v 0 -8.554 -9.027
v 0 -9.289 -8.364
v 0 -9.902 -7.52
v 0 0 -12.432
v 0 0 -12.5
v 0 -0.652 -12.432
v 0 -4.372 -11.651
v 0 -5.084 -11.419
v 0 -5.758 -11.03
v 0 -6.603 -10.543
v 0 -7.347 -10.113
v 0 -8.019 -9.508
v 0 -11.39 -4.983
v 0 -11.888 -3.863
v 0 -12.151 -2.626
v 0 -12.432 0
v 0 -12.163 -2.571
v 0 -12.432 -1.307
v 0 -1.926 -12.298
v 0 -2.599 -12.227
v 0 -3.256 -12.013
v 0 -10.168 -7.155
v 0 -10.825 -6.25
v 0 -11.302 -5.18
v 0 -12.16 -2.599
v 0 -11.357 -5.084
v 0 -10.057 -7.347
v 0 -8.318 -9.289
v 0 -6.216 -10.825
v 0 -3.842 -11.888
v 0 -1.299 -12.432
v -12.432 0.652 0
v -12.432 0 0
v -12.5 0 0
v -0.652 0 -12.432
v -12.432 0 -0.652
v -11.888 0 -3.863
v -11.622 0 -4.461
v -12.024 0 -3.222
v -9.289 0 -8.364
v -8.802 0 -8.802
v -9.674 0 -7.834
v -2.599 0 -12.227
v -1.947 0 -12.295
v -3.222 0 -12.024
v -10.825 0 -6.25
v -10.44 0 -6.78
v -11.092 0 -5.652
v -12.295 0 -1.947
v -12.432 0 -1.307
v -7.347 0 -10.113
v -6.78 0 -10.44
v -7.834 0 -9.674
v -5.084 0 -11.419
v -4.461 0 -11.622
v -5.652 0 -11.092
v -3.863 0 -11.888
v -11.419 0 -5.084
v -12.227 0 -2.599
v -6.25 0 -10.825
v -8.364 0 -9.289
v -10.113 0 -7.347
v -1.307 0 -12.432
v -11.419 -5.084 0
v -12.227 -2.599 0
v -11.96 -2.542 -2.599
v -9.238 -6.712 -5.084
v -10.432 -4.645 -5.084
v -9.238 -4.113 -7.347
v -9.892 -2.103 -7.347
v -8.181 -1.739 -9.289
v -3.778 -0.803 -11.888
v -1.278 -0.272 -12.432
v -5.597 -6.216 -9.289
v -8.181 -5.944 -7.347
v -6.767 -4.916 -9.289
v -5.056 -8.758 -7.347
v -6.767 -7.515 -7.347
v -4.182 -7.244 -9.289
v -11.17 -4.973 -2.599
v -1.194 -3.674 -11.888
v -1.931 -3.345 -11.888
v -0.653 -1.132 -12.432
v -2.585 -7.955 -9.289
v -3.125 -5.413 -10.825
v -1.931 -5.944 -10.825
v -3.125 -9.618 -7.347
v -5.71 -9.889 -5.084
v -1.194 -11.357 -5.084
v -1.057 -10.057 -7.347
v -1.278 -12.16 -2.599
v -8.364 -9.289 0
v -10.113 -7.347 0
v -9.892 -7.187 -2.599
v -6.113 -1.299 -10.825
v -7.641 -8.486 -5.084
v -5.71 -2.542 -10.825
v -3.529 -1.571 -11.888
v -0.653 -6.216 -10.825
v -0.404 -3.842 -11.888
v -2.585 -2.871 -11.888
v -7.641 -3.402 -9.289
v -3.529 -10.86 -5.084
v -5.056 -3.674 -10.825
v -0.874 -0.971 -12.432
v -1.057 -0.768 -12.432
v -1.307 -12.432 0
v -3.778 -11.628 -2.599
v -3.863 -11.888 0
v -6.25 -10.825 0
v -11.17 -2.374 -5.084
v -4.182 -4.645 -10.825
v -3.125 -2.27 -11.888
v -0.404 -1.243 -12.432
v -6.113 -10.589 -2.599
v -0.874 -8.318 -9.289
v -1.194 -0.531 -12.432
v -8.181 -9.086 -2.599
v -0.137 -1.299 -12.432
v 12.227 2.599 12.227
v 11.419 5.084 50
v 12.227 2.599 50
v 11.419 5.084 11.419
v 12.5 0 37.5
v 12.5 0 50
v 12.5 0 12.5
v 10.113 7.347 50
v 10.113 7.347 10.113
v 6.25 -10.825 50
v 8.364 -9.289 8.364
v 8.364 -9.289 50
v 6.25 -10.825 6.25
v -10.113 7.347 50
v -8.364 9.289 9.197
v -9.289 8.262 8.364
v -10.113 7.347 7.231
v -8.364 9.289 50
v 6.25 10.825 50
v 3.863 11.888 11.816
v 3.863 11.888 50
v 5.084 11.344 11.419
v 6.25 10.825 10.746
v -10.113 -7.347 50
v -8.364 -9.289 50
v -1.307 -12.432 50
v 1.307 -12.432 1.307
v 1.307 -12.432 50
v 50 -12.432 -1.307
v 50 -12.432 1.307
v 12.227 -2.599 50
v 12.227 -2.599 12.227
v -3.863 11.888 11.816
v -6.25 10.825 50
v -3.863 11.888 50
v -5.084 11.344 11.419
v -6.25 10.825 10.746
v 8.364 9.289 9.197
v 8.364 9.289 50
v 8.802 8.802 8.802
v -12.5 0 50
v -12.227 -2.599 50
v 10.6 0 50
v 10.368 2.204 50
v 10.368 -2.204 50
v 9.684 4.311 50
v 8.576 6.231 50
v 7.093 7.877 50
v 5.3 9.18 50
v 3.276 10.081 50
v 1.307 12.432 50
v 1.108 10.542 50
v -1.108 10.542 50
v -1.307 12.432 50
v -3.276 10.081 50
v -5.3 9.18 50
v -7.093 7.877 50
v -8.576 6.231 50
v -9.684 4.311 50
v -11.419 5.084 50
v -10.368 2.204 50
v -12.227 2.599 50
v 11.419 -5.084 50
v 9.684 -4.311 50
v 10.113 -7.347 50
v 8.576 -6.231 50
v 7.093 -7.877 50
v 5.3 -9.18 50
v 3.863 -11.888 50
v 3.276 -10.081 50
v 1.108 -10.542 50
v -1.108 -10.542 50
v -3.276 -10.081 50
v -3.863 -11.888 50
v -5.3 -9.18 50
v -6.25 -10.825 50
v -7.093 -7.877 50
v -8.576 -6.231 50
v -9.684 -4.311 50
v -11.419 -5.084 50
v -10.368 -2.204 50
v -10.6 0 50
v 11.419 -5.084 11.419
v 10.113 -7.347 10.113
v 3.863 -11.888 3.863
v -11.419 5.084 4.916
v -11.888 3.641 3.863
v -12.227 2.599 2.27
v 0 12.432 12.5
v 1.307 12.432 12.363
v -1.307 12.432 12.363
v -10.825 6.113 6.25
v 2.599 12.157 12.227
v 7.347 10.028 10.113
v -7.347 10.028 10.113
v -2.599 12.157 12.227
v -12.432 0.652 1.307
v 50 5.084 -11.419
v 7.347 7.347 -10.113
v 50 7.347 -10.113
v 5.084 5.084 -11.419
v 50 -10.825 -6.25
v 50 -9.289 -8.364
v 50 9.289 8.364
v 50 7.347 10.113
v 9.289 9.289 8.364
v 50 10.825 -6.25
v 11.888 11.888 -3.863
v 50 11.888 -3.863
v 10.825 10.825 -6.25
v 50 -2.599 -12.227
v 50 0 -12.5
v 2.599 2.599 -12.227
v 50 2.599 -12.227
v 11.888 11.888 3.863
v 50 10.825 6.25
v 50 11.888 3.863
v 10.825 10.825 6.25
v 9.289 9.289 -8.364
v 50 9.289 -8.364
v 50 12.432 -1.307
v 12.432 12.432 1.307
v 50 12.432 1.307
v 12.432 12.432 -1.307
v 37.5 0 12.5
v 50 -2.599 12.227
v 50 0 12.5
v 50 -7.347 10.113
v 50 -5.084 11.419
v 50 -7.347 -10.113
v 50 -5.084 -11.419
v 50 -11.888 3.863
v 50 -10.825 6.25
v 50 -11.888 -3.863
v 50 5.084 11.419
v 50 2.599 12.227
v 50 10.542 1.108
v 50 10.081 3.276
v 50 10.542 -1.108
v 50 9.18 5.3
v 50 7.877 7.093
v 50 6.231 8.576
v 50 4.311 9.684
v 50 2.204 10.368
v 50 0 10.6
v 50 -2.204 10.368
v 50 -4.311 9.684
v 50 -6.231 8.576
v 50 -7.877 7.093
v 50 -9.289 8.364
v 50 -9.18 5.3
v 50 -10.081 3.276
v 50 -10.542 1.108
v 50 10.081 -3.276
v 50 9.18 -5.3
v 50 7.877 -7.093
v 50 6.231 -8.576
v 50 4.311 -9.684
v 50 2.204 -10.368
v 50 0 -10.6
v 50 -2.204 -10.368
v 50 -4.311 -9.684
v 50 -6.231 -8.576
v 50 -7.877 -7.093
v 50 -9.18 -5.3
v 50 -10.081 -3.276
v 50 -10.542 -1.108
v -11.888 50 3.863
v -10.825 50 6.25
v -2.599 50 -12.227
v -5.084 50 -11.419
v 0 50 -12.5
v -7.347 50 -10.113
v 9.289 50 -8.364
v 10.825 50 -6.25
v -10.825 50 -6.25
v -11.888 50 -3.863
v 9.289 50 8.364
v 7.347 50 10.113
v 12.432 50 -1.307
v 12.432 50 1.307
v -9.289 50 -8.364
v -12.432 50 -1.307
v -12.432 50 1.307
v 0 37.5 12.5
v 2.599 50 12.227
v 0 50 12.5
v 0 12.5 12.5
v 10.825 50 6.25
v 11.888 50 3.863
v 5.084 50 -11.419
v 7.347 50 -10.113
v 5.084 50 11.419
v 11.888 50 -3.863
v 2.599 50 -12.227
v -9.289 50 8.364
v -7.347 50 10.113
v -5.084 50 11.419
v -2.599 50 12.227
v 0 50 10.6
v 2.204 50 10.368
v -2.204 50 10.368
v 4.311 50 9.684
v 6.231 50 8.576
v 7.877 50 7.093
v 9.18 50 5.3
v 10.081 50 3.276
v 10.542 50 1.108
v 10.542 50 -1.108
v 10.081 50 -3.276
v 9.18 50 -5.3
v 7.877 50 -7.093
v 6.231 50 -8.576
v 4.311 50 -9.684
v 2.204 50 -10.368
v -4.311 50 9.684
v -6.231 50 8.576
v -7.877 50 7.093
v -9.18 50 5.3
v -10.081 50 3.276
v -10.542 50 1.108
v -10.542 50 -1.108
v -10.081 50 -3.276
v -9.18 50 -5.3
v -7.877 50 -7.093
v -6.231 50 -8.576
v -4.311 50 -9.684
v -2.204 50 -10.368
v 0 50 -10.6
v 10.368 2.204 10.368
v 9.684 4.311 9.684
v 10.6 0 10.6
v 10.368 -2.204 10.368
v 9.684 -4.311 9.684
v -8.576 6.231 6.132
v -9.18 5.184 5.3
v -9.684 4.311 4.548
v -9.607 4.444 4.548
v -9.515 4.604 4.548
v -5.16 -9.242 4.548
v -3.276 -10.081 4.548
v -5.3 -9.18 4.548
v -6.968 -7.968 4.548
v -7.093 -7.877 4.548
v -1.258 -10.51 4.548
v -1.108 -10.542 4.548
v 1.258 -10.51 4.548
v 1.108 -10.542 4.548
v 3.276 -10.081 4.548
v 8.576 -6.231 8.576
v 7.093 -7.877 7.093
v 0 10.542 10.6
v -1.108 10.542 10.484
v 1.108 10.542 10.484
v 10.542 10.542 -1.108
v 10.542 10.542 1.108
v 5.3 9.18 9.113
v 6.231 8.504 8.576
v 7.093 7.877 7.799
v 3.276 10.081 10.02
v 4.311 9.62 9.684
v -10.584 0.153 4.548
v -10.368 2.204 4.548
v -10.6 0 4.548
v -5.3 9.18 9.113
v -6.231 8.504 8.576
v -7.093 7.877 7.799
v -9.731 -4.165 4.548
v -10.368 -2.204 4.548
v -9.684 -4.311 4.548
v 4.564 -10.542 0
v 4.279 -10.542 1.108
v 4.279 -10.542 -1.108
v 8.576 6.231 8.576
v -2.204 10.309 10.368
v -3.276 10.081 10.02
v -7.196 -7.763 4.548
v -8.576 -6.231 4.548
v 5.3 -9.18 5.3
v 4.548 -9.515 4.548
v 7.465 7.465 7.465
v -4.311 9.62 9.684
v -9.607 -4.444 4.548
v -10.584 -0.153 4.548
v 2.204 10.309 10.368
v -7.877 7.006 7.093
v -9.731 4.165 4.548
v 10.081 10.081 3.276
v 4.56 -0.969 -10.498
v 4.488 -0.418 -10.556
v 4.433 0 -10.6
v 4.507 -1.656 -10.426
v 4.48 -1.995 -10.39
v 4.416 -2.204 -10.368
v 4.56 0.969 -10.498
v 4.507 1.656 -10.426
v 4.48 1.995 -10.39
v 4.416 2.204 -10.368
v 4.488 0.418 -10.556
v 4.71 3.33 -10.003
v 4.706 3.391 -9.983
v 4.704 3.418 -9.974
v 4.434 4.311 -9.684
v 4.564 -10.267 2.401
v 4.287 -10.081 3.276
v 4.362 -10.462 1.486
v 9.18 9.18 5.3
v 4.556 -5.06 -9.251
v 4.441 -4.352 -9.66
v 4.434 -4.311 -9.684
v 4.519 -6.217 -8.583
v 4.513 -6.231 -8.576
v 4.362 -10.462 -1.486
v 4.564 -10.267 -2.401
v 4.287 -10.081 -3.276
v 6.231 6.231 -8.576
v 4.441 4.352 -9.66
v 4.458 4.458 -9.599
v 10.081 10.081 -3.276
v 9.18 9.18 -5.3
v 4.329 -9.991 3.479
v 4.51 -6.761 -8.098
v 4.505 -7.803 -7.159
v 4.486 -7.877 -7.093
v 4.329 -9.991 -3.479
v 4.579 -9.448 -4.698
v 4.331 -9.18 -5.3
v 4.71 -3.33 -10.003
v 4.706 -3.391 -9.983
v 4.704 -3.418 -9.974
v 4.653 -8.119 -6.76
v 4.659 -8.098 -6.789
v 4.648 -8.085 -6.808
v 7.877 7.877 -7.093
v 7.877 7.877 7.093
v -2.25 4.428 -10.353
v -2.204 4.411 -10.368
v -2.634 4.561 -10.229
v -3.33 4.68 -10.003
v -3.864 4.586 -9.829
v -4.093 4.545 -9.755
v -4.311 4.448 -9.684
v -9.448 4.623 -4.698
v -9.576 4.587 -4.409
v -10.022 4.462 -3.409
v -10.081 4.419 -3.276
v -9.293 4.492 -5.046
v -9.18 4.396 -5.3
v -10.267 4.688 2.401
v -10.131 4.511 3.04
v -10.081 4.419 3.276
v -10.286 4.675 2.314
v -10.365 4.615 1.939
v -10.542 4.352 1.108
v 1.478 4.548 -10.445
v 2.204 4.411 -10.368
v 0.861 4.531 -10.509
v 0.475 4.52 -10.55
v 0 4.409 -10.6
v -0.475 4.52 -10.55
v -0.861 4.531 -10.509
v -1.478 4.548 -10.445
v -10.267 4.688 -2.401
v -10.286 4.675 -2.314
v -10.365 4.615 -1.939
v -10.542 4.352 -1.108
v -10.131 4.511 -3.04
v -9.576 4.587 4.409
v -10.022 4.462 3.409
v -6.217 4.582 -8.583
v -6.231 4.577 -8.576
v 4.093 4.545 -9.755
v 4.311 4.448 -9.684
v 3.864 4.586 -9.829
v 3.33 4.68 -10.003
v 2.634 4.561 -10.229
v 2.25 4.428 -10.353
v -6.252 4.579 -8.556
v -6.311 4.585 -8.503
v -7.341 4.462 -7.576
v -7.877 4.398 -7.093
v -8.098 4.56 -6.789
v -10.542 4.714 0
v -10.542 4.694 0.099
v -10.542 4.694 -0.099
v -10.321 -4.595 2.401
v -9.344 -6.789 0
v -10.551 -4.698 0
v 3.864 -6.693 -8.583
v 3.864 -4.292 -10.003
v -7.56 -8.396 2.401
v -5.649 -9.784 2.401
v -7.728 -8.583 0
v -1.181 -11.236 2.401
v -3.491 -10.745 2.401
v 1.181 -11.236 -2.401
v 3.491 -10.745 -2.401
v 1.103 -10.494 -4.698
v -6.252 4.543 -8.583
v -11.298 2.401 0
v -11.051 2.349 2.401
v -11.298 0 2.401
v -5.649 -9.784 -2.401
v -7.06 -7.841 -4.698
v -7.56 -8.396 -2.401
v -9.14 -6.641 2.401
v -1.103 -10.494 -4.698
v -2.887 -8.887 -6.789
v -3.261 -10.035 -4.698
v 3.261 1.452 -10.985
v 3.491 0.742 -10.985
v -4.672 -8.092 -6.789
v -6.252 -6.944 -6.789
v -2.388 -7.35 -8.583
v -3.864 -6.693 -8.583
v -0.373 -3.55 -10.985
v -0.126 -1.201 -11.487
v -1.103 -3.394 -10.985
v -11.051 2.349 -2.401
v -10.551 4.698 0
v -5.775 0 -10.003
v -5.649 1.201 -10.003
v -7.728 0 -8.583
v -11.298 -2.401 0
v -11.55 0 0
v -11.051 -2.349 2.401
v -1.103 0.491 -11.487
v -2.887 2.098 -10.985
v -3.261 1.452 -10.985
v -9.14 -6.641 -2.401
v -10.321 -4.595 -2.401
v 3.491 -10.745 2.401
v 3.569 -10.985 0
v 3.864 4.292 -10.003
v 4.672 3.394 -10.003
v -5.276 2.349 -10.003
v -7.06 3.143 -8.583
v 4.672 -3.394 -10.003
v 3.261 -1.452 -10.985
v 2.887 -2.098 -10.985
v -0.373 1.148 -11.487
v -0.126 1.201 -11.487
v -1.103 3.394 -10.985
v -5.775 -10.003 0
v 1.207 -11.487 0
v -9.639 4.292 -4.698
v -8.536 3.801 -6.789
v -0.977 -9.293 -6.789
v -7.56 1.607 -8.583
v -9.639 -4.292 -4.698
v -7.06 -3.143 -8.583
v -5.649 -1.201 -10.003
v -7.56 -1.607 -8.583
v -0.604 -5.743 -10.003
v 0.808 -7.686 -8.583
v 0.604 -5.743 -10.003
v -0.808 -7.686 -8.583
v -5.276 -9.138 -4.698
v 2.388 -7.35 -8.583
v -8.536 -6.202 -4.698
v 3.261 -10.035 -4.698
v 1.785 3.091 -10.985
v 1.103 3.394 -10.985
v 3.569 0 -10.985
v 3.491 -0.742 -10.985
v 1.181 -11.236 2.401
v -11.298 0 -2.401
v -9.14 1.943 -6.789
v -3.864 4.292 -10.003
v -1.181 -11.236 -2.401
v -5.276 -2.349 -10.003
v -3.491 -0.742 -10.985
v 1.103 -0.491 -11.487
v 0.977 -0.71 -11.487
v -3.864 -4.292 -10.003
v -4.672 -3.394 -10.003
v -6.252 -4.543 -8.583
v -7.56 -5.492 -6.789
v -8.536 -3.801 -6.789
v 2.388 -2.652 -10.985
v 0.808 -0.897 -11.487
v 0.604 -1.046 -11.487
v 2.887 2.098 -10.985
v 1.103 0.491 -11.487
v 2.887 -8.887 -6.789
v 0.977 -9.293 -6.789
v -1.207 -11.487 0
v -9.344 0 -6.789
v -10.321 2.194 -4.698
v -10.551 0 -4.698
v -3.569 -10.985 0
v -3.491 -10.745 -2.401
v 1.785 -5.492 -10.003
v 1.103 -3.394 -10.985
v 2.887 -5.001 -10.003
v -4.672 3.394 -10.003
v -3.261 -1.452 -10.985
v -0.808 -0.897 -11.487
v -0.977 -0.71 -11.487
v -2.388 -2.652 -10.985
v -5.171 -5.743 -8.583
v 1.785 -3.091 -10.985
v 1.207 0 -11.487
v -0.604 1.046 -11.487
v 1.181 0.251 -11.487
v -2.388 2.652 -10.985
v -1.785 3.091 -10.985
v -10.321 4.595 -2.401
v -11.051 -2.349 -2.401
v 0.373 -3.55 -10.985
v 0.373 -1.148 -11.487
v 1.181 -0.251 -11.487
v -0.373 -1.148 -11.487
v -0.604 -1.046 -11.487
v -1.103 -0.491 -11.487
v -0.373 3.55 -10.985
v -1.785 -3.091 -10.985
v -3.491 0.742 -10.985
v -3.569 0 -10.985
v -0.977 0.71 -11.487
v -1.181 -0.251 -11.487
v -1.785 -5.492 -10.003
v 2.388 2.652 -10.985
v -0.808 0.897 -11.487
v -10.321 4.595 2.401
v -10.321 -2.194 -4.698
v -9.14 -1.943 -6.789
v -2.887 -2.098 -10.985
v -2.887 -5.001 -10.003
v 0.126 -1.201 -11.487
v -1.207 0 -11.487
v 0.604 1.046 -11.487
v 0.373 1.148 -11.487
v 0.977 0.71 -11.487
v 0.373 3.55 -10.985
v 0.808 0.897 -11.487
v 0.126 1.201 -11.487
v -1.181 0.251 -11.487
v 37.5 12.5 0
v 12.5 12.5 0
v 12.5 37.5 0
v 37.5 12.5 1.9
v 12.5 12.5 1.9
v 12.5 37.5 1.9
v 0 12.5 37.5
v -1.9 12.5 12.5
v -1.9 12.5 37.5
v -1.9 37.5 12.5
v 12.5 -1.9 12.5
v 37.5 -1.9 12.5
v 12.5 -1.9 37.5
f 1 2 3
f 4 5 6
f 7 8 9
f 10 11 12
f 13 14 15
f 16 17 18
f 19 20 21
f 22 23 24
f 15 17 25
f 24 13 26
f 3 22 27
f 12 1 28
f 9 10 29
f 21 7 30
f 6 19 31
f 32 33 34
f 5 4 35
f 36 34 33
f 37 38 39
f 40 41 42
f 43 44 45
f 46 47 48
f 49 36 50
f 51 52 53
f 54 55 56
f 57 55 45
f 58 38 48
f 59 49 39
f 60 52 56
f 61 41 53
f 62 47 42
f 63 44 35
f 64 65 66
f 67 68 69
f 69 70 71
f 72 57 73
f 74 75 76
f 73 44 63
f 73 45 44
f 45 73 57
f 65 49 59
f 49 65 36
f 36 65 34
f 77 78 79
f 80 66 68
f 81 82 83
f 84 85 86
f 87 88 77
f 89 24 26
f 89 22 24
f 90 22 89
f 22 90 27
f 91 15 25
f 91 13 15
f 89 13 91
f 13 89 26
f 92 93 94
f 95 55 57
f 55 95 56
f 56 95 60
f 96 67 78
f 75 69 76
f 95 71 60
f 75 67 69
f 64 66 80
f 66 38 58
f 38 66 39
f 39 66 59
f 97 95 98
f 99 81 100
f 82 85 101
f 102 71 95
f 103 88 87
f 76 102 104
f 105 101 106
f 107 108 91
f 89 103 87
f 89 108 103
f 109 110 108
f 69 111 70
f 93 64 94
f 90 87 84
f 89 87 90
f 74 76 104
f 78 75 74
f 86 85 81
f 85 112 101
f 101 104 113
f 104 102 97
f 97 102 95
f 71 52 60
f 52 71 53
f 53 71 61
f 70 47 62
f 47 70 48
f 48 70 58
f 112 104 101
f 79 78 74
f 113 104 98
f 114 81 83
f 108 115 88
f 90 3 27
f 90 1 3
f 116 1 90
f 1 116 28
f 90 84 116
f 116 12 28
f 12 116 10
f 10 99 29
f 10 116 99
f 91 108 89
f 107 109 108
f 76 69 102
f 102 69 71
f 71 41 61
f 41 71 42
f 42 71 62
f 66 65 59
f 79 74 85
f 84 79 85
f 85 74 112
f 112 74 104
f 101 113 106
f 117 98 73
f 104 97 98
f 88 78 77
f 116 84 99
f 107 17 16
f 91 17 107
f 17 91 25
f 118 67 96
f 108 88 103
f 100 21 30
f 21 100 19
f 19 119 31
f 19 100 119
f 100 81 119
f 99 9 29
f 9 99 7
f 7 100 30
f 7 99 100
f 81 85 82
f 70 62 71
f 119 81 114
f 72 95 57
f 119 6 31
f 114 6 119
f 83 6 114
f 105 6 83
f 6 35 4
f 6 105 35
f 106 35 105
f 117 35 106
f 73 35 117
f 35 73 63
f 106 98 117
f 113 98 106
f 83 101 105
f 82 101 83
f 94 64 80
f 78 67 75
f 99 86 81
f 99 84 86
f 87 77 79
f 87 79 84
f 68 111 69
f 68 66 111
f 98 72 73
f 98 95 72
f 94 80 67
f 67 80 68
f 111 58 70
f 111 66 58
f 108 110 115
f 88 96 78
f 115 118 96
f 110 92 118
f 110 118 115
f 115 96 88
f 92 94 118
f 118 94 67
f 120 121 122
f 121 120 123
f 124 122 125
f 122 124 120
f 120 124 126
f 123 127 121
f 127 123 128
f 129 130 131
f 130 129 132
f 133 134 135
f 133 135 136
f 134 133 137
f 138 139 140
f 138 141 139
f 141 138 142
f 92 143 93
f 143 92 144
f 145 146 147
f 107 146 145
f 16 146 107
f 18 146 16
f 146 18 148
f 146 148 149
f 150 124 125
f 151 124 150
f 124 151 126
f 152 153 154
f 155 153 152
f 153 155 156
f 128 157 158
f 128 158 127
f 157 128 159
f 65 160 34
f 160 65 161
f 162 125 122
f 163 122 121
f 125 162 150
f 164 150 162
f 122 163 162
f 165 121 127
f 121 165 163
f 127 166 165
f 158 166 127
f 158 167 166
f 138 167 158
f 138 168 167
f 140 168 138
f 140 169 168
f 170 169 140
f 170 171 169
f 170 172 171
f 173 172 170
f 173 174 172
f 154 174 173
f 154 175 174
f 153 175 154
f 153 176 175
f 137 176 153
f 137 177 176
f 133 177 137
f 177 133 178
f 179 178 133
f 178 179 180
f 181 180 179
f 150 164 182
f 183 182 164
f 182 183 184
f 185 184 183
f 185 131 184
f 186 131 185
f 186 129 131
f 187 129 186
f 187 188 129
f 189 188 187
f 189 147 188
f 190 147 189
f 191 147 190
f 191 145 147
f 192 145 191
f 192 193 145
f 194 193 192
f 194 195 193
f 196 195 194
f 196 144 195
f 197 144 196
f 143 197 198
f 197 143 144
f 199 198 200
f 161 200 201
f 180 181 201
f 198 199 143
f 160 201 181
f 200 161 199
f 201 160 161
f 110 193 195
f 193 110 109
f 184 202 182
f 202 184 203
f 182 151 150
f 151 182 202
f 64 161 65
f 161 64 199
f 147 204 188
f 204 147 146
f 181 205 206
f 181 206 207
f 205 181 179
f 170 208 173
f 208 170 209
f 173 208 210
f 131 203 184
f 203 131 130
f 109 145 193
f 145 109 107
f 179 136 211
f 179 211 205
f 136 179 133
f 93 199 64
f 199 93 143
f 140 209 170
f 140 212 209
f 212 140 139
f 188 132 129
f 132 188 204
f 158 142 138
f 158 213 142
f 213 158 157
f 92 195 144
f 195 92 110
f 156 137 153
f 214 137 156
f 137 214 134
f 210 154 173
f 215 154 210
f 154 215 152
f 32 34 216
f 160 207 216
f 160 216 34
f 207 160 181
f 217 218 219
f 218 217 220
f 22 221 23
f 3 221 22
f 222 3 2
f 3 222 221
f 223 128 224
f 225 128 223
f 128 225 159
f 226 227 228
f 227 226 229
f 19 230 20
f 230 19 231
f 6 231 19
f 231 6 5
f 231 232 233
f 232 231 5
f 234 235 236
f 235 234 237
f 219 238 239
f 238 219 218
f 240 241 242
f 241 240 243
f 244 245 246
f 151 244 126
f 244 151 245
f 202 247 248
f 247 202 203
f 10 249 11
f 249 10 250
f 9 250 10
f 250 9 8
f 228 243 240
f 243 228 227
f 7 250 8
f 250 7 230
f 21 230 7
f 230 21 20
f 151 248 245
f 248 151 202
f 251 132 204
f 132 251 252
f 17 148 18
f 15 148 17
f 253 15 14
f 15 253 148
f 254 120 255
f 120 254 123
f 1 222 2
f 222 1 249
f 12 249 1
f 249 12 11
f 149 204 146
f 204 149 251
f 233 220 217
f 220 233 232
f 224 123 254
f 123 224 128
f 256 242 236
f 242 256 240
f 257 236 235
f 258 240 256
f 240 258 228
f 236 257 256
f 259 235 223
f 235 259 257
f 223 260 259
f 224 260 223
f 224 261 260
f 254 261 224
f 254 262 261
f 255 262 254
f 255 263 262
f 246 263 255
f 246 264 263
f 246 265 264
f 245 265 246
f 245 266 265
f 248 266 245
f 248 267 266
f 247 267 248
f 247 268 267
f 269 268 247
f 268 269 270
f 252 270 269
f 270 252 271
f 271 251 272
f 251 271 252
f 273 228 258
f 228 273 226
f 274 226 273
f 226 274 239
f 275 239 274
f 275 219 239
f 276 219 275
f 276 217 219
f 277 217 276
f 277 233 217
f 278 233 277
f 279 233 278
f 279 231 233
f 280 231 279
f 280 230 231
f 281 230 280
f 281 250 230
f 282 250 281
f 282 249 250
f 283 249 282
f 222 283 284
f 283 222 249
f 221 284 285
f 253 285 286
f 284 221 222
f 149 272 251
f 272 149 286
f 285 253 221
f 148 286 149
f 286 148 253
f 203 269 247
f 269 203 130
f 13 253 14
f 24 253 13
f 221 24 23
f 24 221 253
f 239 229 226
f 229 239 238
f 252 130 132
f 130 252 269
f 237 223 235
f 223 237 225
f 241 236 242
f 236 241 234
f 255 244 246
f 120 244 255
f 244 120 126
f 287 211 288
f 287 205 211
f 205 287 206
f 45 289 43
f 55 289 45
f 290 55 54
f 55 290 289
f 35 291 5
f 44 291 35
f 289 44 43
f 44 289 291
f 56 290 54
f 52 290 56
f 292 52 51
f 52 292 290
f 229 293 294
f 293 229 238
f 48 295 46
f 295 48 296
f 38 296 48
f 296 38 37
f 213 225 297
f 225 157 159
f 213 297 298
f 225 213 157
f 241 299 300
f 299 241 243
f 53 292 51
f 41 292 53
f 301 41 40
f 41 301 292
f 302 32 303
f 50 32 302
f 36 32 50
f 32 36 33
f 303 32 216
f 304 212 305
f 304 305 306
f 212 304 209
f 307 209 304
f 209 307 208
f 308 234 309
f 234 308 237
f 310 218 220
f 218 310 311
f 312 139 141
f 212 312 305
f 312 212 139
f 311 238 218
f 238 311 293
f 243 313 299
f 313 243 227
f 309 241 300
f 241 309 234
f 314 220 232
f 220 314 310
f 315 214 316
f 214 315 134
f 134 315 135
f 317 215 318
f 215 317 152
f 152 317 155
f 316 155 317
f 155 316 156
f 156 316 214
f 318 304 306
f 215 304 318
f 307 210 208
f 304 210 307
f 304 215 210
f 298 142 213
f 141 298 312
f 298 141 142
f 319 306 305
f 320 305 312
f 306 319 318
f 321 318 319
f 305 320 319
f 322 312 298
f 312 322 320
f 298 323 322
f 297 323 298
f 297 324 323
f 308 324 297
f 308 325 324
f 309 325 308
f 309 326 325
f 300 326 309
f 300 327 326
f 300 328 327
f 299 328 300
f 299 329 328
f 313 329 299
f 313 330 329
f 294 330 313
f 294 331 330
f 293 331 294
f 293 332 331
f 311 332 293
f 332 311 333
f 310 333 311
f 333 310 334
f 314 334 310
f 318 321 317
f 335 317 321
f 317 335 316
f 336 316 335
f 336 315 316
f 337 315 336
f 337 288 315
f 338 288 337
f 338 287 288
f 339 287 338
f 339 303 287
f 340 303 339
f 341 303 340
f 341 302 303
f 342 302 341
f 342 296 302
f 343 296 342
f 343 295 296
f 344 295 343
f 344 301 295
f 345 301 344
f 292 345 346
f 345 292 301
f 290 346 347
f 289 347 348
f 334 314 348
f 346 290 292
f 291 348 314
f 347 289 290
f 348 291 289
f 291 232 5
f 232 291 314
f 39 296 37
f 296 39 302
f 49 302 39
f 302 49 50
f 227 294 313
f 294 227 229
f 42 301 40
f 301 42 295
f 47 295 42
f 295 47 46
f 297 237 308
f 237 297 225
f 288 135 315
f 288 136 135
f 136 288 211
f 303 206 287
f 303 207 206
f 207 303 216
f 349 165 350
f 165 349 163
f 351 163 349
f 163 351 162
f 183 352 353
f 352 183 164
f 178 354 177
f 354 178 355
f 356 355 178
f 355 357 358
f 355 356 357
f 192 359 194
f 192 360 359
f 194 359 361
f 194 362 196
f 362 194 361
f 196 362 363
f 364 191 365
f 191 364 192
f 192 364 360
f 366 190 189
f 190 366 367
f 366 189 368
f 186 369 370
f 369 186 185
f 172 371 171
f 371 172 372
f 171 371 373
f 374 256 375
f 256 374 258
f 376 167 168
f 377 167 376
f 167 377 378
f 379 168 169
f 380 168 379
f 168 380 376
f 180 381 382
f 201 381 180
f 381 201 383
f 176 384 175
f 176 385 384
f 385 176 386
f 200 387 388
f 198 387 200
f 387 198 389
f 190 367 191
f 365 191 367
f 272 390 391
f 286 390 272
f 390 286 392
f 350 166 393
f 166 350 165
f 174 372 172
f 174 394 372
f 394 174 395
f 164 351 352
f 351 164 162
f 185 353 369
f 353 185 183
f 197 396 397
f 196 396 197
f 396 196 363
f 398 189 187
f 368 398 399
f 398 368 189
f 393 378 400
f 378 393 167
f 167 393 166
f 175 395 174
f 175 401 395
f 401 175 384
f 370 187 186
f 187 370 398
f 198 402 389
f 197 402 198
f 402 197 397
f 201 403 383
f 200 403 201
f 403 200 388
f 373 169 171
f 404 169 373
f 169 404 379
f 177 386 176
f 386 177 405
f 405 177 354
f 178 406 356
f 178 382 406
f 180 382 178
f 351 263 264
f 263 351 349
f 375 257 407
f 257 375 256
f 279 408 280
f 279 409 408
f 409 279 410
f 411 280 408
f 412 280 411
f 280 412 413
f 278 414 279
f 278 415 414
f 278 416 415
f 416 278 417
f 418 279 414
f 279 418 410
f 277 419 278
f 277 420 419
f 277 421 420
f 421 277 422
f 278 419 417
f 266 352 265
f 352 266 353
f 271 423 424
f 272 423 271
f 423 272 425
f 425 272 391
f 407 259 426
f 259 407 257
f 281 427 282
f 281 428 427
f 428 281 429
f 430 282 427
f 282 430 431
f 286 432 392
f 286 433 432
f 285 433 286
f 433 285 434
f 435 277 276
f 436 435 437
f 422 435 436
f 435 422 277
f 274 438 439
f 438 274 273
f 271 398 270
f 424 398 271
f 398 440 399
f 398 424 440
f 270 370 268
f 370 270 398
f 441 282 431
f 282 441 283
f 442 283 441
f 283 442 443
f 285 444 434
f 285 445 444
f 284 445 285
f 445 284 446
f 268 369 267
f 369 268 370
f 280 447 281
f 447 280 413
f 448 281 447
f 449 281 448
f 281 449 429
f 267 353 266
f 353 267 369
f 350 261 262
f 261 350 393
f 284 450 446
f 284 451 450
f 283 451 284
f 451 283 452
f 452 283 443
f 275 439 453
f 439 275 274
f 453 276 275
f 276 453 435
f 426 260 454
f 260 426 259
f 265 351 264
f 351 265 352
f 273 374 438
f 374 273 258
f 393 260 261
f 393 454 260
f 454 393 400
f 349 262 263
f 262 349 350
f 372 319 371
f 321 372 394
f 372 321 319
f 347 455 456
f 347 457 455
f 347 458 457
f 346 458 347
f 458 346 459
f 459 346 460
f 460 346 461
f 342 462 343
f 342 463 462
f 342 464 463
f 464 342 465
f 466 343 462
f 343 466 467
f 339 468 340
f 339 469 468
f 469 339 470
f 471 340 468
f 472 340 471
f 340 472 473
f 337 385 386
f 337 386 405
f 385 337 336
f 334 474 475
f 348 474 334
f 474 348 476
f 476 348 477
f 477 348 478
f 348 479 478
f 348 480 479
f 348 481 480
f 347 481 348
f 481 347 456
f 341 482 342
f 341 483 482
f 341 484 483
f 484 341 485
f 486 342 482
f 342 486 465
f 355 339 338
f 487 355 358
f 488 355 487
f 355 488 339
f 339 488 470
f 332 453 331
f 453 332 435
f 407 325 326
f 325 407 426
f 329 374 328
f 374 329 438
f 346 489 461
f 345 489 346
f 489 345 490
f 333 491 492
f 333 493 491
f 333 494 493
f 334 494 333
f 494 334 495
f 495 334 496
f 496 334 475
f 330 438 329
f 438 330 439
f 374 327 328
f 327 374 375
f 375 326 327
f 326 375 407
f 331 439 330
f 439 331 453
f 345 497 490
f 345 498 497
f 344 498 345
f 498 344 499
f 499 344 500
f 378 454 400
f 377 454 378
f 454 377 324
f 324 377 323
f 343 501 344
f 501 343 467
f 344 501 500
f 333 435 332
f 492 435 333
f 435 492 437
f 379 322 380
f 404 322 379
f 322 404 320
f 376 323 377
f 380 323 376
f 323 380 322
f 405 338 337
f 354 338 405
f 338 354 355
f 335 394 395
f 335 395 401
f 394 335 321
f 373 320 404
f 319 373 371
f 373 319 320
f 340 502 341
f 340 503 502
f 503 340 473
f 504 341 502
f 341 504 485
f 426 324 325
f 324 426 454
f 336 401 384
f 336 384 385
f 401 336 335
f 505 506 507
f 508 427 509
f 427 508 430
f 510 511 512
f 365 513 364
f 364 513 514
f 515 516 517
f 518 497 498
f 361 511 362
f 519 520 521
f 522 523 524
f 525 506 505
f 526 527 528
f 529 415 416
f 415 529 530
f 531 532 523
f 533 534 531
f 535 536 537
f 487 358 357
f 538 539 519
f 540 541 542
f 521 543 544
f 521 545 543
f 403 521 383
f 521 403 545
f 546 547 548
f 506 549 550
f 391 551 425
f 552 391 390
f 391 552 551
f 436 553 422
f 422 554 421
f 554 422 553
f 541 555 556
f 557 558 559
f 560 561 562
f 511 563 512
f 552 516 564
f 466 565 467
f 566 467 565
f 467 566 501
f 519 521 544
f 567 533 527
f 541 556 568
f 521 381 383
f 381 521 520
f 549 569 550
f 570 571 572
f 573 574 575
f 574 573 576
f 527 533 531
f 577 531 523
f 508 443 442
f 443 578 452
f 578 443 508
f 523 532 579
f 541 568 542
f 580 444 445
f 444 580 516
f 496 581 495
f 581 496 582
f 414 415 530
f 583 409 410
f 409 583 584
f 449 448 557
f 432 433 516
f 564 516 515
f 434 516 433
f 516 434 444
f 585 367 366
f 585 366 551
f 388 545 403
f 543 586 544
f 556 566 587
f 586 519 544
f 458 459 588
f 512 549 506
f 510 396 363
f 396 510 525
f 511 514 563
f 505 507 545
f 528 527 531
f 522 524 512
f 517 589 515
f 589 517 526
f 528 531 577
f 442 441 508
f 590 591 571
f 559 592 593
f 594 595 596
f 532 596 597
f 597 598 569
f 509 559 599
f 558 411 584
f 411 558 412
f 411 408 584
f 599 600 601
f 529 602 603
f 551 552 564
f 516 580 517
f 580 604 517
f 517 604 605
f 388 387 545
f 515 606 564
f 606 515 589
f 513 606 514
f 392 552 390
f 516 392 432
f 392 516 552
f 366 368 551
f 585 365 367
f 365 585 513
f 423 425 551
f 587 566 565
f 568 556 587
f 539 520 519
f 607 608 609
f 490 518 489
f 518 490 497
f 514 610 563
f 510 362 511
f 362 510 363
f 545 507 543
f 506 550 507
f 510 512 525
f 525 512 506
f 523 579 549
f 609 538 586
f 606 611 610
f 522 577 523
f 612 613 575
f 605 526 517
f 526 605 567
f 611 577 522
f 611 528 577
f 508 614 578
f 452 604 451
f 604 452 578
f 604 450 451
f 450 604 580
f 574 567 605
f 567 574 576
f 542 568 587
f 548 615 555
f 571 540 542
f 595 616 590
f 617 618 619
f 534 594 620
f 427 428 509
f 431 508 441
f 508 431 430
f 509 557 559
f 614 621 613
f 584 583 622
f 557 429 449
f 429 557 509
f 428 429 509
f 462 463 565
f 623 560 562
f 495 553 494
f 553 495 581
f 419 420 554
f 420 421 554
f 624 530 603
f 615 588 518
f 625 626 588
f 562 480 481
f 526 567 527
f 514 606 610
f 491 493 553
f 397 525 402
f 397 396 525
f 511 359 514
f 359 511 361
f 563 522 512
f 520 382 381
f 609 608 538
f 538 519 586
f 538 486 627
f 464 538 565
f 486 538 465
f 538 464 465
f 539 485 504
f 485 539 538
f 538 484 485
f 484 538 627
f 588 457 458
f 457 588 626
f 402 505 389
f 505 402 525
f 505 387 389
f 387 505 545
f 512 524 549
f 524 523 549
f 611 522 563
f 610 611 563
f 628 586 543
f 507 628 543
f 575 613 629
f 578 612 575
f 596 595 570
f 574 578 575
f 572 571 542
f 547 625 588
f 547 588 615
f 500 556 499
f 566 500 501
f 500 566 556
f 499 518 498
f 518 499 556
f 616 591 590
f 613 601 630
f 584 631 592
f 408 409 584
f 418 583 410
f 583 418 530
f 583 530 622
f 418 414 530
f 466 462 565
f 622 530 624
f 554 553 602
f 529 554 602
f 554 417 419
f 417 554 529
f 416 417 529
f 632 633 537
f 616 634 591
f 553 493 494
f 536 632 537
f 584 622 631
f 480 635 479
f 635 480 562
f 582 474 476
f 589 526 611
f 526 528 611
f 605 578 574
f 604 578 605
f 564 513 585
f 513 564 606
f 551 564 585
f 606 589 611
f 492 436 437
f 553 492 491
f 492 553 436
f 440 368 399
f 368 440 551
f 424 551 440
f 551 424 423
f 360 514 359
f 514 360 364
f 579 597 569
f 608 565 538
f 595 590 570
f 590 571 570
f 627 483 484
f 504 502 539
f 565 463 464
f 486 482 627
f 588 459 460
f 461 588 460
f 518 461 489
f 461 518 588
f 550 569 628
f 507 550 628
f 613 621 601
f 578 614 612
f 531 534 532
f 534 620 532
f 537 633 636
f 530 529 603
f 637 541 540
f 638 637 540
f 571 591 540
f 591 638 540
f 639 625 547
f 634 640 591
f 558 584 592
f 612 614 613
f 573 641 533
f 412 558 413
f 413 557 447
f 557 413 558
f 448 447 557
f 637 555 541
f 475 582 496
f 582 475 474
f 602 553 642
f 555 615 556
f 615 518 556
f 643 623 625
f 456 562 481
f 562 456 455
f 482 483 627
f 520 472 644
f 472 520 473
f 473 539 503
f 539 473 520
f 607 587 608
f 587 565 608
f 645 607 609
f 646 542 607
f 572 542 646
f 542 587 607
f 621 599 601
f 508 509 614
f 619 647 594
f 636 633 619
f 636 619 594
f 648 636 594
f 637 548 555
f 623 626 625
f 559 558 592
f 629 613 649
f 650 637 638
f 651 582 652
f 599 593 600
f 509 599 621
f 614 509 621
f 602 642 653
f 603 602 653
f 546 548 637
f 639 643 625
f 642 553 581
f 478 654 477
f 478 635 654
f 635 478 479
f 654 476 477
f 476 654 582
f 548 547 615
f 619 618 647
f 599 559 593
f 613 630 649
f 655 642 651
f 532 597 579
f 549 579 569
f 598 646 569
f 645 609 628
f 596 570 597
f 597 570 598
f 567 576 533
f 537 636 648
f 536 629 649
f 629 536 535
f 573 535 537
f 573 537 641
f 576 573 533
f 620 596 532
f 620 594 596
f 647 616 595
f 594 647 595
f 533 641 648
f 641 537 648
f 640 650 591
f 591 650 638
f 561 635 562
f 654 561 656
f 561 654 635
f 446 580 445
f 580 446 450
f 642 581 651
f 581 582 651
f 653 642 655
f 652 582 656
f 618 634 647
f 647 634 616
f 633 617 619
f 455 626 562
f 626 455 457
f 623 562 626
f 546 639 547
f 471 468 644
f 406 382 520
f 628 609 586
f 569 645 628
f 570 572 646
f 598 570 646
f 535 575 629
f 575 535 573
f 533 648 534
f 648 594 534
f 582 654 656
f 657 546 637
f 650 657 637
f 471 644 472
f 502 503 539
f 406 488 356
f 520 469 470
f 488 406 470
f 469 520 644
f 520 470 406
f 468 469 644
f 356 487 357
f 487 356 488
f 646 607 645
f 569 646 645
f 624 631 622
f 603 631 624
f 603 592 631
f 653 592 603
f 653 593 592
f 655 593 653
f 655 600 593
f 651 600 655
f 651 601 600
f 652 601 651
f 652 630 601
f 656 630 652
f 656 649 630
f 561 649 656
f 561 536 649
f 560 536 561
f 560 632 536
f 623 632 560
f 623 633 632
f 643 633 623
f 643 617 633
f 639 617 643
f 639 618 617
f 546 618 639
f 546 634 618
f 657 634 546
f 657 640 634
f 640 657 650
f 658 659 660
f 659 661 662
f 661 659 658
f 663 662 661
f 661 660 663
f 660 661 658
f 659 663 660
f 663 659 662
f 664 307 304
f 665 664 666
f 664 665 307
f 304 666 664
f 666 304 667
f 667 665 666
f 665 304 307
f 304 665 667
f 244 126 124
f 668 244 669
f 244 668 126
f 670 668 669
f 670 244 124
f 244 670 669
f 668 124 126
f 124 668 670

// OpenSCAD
length = 50;
pipe_od = 25;
pipe_thickness = 1.9;

difference() {
    union() {
        cylinder(h=length, d=pipe_od);
        rotate([0,90,0]) cylinder(h=length, d=pipe_od);
        rotate([0,90,90]) cylinder(h=length, d=pipe_od);
        intersection() {
            translate([-pipe_od/2, -pipe_od/2, -pipe_od/2]) cube(pipe_od/2);
            sphere((pipe_od/2));
        };
    }
    cylinder(h=length, d= (pipe_od-(2*pipe_thickness)));
    rotate([0,90,0]) cylinder(h=length, d= (pipe_od-(2*pipe_thickness)));
    rotate([0,90,90]) cylinder(h=length, d= (pipe_od-(2*pipe_thickness)));
    sphere((pipe_od-pipe_thickness)/2);
}

module support() {
    linear_extrude(pipe_thickness)
    polygon(points=[[pipe_od/2,pipe_od/2],[pipe_od/2,length-(pipe_od/2)],[length-(pipe_od/2),pipe_od/2]]);
    
}

support();
rotate([0,-90,0]) support();
rotate([90,0,0]) support();
